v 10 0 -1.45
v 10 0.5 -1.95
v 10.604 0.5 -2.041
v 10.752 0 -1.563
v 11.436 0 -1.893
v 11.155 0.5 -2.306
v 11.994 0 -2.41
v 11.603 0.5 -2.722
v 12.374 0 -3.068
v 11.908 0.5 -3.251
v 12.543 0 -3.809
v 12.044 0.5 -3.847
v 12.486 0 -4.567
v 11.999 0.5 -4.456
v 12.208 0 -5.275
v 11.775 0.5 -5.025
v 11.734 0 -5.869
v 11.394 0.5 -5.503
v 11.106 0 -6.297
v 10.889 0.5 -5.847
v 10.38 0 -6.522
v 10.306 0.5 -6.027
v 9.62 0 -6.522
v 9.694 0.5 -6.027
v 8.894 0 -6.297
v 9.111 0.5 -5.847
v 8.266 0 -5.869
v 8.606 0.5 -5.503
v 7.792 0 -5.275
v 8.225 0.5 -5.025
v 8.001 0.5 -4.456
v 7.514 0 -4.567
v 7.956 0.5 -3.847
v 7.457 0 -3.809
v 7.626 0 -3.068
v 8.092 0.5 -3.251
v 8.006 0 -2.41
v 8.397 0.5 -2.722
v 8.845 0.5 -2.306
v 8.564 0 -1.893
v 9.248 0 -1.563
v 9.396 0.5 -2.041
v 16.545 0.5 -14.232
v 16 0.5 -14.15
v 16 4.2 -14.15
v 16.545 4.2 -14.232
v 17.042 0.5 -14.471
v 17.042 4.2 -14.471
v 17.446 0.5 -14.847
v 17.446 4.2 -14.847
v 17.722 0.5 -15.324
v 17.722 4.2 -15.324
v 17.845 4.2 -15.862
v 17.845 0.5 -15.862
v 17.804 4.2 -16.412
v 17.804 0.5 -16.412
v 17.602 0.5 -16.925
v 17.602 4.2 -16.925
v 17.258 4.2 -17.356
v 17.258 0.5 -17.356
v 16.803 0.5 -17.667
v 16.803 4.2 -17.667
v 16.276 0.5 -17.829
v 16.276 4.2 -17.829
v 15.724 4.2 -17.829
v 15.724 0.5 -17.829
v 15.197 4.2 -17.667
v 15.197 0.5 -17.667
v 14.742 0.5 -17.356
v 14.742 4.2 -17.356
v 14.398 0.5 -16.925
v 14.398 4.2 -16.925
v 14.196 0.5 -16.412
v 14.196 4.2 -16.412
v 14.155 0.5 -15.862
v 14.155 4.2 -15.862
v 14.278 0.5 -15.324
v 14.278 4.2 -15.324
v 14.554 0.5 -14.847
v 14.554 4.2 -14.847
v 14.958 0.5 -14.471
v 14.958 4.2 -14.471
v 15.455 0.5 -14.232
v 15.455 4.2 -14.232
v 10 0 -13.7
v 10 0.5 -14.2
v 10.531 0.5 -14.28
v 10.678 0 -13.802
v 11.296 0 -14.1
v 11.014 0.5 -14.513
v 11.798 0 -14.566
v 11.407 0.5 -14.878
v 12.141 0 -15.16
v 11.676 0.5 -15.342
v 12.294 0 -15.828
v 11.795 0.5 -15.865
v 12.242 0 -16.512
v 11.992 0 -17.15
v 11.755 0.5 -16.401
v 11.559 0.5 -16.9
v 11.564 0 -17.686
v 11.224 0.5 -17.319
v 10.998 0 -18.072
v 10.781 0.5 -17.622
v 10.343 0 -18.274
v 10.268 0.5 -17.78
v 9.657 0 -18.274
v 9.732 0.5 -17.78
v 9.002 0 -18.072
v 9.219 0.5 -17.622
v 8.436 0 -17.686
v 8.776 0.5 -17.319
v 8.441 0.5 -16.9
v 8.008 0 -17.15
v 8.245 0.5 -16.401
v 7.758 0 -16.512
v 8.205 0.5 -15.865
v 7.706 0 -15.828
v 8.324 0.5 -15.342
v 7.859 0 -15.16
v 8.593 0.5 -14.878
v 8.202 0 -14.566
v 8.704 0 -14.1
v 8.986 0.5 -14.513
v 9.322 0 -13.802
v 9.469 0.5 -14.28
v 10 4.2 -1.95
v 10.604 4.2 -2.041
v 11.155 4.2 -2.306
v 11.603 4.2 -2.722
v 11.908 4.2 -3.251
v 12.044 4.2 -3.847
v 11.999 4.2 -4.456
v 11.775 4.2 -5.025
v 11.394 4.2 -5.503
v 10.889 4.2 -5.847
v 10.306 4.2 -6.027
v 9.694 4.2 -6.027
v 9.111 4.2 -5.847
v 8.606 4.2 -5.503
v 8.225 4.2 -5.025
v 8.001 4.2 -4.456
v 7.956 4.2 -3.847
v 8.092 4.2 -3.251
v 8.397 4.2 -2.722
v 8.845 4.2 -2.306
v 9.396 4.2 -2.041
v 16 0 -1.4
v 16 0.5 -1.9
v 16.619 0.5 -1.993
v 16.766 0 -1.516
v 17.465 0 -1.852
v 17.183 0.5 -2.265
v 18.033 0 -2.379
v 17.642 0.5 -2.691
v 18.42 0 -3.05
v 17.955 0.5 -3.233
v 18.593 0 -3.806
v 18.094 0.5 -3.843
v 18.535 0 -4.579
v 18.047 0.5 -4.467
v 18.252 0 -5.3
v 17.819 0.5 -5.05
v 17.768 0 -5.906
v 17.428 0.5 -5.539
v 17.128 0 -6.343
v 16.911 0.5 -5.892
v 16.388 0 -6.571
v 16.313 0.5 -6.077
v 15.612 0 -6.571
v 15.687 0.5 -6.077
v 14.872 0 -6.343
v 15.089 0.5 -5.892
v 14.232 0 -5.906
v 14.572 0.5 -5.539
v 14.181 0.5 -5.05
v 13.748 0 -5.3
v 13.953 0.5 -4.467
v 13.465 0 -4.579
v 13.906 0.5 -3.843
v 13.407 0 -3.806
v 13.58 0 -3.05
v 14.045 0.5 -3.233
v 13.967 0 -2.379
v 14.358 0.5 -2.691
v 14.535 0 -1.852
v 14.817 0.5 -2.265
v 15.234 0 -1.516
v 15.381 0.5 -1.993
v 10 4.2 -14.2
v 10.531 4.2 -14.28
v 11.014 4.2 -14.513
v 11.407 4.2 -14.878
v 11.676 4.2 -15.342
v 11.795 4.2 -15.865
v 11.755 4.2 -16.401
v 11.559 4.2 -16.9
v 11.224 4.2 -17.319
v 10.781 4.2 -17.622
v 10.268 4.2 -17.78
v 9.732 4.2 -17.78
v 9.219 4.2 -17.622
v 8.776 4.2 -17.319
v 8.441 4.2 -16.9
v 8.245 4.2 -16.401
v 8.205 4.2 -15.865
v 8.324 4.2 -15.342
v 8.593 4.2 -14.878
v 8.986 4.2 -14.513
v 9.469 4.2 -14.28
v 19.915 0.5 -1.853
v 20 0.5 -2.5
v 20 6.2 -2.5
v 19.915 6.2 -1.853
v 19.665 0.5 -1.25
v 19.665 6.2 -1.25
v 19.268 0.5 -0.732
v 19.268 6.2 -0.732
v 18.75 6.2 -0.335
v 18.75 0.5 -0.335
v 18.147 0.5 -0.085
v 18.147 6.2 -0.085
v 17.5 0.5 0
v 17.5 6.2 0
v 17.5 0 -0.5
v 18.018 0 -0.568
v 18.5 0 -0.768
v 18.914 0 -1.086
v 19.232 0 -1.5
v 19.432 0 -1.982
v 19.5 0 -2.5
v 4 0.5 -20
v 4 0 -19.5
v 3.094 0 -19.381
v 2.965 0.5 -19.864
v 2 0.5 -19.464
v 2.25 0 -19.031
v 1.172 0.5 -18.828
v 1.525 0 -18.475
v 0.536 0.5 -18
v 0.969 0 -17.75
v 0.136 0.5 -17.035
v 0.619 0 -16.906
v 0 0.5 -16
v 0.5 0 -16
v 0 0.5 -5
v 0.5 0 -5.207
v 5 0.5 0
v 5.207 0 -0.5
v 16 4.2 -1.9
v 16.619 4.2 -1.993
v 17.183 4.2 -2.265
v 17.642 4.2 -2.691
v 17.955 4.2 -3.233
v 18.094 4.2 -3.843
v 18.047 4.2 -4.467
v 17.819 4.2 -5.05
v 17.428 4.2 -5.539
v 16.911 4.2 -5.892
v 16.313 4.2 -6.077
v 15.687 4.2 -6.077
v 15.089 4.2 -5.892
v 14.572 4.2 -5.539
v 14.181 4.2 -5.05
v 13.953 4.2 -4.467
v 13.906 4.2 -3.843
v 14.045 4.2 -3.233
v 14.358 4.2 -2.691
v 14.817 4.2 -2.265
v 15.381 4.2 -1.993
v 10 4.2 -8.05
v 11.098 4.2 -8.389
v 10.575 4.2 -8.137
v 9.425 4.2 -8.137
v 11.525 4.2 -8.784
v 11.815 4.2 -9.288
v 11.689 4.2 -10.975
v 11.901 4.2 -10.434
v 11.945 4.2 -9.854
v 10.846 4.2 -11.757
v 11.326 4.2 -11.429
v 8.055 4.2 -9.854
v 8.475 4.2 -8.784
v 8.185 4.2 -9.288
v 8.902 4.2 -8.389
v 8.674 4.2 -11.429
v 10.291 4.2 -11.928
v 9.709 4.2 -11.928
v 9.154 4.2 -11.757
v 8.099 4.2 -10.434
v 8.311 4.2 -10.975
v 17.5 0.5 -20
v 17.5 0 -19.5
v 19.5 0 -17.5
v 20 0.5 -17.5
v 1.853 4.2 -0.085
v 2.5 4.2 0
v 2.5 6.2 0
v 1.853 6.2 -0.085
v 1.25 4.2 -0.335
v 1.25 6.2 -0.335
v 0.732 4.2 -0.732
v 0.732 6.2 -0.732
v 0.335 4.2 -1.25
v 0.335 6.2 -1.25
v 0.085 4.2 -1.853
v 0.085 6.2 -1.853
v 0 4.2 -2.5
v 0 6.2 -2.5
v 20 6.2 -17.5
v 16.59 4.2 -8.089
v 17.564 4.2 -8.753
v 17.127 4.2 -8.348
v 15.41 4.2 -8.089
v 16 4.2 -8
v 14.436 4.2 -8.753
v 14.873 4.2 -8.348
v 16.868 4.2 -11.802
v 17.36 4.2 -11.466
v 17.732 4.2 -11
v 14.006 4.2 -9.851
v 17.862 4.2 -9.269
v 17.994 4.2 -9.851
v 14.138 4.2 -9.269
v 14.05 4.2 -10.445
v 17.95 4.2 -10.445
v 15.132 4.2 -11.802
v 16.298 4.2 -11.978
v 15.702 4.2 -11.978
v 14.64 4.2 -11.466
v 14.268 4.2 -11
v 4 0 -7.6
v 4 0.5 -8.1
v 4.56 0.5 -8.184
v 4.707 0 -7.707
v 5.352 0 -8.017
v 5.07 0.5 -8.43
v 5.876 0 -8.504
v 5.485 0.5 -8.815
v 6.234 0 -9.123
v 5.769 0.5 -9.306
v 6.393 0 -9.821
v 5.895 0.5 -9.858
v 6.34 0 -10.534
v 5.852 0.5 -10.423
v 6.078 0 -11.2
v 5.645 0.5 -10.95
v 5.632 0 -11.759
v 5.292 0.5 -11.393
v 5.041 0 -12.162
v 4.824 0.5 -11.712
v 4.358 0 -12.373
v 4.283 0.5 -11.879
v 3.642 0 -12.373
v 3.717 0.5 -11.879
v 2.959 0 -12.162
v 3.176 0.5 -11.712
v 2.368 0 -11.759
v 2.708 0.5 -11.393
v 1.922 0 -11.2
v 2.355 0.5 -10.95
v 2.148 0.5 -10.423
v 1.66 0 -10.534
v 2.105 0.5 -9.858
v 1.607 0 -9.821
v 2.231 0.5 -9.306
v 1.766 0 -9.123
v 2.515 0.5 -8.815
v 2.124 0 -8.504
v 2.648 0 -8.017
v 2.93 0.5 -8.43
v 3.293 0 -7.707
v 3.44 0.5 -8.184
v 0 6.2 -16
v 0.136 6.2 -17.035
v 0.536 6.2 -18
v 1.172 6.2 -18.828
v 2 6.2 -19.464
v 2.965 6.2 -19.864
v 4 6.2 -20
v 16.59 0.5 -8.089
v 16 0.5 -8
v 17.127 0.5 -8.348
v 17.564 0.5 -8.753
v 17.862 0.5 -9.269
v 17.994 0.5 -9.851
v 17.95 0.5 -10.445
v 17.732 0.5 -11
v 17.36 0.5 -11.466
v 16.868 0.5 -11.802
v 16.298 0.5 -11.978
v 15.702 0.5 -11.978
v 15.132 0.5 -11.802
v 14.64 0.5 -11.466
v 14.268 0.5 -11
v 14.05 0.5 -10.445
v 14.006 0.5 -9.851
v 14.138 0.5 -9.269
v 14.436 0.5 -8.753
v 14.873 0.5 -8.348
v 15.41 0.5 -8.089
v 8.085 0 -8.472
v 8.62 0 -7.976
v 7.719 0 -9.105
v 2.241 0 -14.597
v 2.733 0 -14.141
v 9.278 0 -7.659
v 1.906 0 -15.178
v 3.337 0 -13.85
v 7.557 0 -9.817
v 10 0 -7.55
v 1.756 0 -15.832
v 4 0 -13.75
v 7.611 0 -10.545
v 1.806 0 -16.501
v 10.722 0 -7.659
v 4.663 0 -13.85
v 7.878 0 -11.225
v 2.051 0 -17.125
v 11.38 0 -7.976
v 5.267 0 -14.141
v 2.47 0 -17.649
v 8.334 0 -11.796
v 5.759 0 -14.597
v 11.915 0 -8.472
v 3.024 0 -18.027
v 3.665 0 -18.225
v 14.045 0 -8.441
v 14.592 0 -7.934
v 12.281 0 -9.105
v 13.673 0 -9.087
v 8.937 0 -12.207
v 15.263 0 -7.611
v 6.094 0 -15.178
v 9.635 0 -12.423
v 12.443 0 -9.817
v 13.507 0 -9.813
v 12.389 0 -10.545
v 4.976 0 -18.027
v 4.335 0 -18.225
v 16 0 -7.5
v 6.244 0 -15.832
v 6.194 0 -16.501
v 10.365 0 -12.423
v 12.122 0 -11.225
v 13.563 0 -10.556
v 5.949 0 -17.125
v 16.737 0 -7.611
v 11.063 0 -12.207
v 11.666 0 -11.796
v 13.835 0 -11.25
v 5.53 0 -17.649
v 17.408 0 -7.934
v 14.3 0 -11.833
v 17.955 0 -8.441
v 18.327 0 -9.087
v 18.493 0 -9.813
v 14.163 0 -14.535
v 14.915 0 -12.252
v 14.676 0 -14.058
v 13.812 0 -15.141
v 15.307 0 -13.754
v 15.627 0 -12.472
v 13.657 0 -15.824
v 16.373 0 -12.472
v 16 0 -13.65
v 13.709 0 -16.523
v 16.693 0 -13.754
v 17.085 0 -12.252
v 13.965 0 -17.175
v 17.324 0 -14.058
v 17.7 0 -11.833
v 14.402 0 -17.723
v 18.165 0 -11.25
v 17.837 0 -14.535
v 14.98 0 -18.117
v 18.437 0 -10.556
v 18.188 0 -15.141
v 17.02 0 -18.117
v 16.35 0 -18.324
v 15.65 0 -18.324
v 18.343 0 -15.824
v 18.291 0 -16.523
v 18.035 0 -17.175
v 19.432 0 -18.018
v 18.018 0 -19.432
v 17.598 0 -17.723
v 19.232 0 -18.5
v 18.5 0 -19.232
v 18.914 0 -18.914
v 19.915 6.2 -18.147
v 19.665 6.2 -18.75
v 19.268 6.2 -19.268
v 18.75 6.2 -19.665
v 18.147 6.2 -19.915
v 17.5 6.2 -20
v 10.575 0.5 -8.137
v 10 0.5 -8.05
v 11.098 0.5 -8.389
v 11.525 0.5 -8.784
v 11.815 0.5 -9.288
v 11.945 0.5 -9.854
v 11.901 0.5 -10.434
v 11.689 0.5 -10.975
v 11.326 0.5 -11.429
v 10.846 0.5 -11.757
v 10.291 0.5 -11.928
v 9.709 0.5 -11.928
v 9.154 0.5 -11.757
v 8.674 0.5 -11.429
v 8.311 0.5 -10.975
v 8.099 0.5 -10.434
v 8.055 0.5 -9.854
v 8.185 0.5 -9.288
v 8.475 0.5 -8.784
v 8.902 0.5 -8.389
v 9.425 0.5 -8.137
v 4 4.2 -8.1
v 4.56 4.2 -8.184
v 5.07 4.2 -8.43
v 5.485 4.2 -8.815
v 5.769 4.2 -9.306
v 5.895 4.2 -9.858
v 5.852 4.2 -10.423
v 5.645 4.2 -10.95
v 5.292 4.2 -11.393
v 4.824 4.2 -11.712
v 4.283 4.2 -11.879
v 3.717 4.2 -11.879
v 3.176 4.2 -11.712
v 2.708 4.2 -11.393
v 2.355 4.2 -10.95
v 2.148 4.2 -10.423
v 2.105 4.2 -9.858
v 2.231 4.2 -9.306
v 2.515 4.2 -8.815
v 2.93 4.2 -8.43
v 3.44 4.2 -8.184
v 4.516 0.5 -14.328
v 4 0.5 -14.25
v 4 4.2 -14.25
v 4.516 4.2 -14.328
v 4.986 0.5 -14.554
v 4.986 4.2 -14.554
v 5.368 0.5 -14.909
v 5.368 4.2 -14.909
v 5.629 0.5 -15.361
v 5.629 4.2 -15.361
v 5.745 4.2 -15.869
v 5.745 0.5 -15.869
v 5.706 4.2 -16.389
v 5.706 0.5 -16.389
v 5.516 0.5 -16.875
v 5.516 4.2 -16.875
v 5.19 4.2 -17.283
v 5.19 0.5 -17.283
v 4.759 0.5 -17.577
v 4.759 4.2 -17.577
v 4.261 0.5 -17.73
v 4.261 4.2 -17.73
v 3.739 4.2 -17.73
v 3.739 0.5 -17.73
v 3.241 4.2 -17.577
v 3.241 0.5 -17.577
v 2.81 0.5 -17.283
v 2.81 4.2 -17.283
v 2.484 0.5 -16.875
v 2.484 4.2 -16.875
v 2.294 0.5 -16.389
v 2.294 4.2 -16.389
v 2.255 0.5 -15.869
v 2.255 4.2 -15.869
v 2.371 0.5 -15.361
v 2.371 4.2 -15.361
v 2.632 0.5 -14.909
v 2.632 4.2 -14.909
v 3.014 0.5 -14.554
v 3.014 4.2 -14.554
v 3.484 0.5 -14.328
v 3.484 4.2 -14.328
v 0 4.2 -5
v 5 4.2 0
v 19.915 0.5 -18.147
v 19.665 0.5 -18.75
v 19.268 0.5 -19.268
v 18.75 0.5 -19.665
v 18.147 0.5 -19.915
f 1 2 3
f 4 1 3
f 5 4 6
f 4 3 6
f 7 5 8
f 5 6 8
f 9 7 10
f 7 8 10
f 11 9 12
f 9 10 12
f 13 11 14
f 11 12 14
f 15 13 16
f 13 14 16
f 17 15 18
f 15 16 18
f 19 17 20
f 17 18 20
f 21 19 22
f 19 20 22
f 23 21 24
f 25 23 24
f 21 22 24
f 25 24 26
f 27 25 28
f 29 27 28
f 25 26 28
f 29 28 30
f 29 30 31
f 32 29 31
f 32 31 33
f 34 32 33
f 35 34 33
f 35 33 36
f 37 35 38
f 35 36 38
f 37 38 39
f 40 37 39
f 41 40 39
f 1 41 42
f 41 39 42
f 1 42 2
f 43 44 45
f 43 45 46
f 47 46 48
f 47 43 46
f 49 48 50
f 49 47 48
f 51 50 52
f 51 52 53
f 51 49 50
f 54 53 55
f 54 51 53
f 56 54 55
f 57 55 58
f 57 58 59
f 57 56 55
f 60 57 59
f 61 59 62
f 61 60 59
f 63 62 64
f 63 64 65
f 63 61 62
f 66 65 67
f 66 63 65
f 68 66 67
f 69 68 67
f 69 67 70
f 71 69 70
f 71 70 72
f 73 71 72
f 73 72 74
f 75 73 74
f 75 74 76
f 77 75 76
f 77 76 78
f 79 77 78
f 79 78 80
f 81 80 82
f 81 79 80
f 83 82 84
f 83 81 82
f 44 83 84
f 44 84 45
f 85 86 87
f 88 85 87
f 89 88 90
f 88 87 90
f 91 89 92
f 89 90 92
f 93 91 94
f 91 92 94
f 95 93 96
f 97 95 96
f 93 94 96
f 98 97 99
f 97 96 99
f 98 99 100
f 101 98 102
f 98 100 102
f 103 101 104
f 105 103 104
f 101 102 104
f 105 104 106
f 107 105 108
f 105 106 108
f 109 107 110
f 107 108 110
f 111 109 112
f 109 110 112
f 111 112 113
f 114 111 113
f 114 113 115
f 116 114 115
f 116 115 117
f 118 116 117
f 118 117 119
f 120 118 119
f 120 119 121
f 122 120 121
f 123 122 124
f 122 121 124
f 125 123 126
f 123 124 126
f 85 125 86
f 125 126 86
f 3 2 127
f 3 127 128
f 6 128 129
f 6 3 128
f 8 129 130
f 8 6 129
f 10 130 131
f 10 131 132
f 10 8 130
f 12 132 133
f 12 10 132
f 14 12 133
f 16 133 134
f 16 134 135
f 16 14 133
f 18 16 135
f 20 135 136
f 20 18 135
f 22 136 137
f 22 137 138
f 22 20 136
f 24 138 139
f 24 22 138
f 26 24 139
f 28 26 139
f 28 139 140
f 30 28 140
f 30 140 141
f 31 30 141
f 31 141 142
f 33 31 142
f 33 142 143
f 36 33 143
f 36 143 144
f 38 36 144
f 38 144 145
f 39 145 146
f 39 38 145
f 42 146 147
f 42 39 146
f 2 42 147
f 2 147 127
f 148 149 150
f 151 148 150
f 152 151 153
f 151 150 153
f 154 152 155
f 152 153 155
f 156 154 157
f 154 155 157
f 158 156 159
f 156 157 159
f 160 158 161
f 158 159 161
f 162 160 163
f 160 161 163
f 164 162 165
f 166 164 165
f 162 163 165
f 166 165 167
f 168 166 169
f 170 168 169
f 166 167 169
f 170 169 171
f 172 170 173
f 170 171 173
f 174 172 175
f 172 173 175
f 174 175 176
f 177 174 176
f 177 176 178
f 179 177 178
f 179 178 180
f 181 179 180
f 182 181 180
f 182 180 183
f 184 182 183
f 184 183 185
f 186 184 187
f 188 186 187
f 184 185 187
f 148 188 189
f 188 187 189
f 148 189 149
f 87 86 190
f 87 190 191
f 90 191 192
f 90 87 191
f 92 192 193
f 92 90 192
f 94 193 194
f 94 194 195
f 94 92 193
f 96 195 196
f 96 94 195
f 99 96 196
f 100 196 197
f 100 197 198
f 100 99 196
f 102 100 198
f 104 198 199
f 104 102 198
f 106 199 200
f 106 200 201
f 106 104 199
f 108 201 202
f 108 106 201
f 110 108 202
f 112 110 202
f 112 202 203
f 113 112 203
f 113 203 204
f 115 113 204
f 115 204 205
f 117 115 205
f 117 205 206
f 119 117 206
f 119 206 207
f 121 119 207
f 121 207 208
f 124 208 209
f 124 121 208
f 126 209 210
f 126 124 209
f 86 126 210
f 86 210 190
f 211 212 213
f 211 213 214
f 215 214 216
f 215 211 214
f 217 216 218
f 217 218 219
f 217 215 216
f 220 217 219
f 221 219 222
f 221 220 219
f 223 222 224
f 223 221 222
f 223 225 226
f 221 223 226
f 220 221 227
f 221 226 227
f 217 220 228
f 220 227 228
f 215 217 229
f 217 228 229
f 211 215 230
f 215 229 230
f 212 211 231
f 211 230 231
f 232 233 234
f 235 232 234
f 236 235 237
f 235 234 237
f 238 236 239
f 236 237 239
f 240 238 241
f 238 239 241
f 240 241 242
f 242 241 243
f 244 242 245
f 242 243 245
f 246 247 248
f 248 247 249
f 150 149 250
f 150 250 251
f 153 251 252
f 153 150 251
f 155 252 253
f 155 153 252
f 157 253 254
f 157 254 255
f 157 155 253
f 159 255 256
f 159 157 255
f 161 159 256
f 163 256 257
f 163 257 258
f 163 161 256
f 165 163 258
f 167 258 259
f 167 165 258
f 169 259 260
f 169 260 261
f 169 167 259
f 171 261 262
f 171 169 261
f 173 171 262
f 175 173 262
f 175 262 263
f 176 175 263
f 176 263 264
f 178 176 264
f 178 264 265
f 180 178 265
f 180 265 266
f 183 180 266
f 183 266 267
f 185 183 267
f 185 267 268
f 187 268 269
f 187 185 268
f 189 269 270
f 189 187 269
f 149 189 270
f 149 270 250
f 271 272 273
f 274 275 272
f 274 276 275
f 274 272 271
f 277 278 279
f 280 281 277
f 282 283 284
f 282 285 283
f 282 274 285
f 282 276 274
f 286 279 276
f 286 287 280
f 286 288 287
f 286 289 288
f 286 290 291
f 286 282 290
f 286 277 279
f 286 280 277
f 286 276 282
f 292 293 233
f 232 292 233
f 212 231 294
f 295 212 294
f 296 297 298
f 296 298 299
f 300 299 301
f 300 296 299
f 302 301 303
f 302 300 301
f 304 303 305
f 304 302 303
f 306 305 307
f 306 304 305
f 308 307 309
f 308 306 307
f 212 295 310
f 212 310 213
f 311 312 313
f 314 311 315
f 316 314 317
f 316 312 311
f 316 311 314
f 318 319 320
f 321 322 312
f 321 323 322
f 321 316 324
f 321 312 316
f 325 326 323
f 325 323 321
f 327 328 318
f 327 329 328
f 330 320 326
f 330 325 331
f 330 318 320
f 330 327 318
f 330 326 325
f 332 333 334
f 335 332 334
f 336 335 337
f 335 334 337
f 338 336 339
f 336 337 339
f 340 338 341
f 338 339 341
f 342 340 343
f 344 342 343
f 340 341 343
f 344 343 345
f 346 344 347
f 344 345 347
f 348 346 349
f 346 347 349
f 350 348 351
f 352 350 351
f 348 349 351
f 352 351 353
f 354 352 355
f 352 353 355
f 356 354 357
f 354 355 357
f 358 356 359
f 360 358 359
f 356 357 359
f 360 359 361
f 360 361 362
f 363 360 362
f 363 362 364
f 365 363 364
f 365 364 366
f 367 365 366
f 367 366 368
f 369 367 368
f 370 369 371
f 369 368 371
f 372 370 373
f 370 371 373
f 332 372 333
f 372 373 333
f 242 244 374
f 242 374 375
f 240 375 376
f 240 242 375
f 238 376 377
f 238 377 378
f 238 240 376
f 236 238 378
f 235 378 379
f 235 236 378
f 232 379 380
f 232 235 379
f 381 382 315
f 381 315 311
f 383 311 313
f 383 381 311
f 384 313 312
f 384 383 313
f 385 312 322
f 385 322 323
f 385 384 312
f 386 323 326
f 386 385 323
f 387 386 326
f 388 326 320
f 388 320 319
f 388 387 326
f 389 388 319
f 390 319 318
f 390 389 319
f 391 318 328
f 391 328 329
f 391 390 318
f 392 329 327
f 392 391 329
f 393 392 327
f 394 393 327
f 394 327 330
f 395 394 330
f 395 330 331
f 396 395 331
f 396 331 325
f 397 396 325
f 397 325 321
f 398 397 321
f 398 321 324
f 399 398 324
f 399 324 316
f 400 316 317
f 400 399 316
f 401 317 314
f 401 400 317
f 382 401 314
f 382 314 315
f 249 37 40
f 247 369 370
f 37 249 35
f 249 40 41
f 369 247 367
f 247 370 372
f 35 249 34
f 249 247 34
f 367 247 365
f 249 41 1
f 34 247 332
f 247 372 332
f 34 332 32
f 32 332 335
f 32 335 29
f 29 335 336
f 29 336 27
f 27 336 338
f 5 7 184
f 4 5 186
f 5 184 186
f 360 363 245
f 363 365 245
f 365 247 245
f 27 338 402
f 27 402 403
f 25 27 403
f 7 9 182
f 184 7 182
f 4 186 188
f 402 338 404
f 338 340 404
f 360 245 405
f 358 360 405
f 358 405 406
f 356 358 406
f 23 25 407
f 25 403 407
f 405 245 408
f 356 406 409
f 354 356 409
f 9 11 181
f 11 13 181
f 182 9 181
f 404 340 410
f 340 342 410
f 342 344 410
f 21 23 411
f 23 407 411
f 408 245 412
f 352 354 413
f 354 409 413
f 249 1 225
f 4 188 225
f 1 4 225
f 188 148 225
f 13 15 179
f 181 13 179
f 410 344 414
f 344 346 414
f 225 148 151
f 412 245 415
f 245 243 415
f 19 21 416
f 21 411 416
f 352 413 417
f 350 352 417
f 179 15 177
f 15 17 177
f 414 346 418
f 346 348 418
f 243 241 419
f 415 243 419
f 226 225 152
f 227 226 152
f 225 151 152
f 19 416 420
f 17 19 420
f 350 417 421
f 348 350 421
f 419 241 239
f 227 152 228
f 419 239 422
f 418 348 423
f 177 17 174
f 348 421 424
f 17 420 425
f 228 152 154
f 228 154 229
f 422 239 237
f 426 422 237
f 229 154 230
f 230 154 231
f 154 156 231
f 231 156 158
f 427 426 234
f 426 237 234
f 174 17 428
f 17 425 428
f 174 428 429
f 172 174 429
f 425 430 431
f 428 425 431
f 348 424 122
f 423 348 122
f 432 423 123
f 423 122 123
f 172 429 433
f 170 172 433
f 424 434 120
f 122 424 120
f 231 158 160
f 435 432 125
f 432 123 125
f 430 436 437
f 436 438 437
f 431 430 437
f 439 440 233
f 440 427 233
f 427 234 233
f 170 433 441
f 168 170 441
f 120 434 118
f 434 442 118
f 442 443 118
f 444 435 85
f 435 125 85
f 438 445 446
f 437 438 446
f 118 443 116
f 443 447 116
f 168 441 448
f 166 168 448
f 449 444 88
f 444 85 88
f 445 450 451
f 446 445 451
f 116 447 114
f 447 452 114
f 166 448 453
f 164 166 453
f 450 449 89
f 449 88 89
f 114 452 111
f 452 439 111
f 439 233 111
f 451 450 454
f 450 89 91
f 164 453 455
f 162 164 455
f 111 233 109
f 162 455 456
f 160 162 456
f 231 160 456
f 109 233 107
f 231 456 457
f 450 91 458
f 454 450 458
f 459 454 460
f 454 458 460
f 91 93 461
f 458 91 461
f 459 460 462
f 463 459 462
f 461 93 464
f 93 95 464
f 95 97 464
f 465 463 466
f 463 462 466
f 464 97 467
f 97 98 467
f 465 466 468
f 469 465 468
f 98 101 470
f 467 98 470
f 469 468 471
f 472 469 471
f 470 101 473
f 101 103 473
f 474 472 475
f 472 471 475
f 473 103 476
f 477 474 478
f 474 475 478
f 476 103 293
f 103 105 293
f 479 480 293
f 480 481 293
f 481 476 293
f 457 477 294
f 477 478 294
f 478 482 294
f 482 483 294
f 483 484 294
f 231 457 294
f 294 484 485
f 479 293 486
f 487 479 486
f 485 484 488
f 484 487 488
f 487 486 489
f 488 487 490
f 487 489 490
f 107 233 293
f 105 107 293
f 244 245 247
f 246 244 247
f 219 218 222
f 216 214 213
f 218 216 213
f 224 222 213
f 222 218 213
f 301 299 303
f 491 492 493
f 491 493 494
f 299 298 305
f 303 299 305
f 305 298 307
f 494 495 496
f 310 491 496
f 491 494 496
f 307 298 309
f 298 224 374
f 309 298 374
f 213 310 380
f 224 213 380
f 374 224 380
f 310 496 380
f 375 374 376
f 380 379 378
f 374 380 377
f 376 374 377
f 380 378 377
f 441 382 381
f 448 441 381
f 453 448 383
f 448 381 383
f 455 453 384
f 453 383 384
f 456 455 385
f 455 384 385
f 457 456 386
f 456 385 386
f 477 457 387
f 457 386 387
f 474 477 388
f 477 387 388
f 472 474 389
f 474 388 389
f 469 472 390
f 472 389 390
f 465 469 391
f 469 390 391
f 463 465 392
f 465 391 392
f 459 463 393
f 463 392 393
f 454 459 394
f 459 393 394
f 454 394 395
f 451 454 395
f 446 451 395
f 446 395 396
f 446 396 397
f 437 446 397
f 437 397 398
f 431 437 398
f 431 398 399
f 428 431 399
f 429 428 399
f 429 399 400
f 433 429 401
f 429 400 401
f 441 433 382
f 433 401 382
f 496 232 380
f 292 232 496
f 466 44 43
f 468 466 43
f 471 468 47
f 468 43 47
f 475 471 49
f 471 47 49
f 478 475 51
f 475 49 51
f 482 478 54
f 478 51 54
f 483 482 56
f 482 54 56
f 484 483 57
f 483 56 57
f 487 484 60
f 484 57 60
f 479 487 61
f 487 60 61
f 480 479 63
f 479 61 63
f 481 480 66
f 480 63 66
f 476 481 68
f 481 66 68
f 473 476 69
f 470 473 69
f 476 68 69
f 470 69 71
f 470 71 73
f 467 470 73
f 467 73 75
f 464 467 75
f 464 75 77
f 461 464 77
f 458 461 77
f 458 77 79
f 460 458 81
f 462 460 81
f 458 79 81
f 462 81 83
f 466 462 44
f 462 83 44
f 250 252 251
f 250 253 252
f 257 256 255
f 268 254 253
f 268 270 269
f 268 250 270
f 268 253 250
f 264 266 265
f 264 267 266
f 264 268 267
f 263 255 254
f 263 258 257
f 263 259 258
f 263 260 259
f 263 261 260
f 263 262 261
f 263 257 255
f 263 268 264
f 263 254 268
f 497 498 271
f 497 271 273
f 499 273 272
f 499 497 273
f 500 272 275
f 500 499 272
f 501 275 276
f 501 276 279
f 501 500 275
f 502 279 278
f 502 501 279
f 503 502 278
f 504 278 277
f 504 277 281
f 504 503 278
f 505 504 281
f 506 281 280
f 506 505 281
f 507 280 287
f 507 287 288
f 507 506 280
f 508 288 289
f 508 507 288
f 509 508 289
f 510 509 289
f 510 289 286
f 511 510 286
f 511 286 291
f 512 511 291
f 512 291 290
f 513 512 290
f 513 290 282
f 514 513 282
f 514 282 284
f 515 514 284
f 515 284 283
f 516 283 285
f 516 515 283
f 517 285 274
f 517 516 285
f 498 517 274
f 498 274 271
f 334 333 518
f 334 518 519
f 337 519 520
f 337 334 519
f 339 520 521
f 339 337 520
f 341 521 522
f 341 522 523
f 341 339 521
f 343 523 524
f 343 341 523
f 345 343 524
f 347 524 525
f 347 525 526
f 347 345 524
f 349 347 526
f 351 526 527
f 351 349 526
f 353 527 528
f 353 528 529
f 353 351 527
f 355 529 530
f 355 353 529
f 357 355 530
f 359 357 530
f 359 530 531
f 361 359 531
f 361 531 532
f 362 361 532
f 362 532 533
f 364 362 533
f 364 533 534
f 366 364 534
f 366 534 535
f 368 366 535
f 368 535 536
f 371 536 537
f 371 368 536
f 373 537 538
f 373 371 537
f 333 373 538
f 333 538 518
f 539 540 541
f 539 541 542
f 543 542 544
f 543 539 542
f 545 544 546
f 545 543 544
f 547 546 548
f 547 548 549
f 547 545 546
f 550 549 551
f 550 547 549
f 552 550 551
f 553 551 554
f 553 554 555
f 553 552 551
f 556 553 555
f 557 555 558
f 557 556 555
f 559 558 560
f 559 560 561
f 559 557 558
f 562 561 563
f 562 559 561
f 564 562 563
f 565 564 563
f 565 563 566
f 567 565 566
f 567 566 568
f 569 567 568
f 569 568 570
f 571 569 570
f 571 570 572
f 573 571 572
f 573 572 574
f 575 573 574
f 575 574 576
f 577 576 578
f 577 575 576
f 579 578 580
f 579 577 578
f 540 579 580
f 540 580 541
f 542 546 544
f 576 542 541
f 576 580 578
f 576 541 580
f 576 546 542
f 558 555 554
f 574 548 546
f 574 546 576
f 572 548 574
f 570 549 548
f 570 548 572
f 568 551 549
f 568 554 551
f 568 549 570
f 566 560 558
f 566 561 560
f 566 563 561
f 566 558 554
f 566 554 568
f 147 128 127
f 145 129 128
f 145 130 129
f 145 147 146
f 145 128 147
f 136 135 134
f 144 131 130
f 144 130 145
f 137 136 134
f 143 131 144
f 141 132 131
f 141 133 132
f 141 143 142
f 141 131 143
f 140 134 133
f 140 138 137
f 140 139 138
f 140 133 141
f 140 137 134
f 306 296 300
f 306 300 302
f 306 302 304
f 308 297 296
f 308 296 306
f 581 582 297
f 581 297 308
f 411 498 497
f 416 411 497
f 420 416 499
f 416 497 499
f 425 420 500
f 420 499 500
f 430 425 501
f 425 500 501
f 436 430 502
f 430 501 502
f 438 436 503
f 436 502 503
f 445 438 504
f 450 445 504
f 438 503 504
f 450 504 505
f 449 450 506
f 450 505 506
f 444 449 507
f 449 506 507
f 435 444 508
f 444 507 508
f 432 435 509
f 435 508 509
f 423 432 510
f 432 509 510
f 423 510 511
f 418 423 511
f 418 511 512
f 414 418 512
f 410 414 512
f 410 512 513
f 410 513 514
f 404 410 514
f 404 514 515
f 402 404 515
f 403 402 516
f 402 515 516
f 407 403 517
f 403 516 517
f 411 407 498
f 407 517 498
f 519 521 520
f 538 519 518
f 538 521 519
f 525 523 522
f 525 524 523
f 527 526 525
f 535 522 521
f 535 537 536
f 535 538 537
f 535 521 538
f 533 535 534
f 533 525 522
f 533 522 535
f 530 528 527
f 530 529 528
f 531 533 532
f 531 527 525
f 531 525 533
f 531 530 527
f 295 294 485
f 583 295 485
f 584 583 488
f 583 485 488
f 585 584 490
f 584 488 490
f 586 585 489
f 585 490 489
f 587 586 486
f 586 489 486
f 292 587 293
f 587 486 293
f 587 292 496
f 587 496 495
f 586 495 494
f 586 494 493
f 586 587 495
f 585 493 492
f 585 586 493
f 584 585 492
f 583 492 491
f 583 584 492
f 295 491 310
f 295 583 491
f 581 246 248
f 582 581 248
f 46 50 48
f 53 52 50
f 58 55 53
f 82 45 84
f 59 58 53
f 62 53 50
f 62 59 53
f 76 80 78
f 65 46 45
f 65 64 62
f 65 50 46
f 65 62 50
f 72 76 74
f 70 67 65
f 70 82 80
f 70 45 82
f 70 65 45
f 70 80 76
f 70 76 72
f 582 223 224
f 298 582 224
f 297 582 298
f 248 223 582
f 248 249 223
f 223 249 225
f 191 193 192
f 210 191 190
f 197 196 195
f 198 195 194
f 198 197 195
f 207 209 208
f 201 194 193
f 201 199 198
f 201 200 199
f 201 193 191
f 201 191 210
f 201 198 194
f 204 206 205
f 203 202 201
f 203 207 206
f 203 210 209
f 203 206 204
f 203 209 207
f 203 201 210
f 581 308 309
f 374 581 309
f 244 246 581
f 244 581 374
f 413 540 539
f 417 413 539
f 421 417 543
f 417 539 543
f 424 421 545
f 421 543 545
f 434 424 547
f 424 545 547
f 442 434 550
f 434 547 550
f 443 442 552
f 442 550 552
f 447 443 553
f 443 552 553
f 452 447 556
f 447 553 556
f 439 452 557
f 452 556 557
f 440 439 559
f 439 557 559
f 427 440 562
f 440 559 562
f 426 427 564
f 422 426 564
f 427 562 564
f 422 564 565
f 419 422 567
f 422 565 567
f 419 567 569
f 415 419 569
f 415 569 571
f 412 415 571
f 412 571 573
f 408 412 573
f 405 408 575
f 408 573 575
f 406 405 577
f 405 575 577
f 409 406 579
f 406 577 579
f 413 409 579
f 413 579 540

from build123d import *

# Parameters (mm, degrees)
SKETCH1_R           = 2.05
SKETCH1_R_2         = 2.1
SKETCH1_R_3         = 1.9
SKETCH1_R_4         = 1.75
SKETCH1_R_5         = 1.95
SKETCH1_R_6         = 2
SKETCH1_R_7         = 1.8
SKETCH1_R_8         = 1.85
BOSS_EXTRUDE1_DEPTH = 4.2
BOSS_EXTRUDE2_DEPTH = 2
CHAMFER1_SIZE       = 0.5


with BuildPart() as part:
    # Sketch1 → Boss-Extrude1 (new body)
    with BuildSketch(Plane(origin=(0, 0, 0), x_dir=(1, 0, 0), z_dir=(0, 1, 0))):
        with BuildLine():
            Line((0, 5), (5, 0))
            Line((5, 0), (17.5, 0))
            ThreePointArc((17.5, 0), (19.267766953, 0.732233047), (20, 2.5))
            Line((20, 2.5), (20, 17.5))
            ThreePointArc((20, 17.5), (19.267766953, 19.267766953), (17.5, 20))
            Line((17.5, 20), (4, 20))
            ThreePointArc((4, 20), (1.171572875, 18.828427125), (0, 16))
            Line((0, 16), (0, 5))
        make_face()
        with Locations(Location((10, 4, 0), (0, 0, 270))):
            Circle(SKETCH1_R, mode=Mode.SUBTRACT)
        with Locations(Location((16, 4, 0), (0, 0, 270))):
            Circle(SKETCH1_R_2, mode=Mode.SUBTRACT)
        with Locations(Location((4, 10, 0), (0, 0, 270))):
            Circle(SKETCH1_R_3, mode=Mode.SUBTRACT)
        with Locations(Location((4, 16, 0), (0, 0, 270))):
            Circle(SKETCH1_R_4, mode=Mode.SUBTRACT)
        with Locations(Location((10, 10, 0), (0, 0, 270))):
            Circle(SKETCH1_R_5, mode=Mode.SUBTRACT)
        with Locations(Location((16, 10, 0), (0, 0, 270))):
            Circle(SKETCH1_R_6, mode=Mode.SUBTRACT)
        with Locations(Location((10, 16, 0), (0, 0, 270))):
            Circle(SKETCH1_R_7, mode=Mode.SUBTRACT)
        with Locations(Location((16, 16, 0), (0, 0, 270))):
            Circle(SKETCH1_R_8, mode=Mode.SUBTRACT)
    extrude(amount=BOSS_EXTRUDE1_DEPTH)

    # Sketch2 → Boss-Extrude2 (add)
    with BuildSketch(Plane(origin=(0, 4.2, 0), x_dir=(1, 0, 0), z_dir=(0, 1, 0))):
        with BuildLine():
            Line((20, 17.5), (20, 2.5))
            ThreePointArc((20, 2.5), (19.267766953, 0.732233047), (17.5, 0))
            Line((17.5, 0), (2.5, 0))
            ThreePointArc((2.5, 0), (0.732233047, 0.732233047), (0, 2.5))
            Line((0, 2.5), (0, 5))
            Line((0, 5), (0, 16))
            ThreePointArc((0, 16), (1.171572875, 18.828427125), (4, 20))
            Line((4, 20), (17.5, 20))
            ThreePointArc((17.5, 20), (19.267766953, 19.267766953), (20, 17.5))
        make_face()
    extrude(amount=BOSS_EXTRUDE2_DEPTH)

    # Chamfer1
    chamfer1_edges = [part.edges().sort_by_distance(p)[0] for p in [
        (19.267766953, 0, -19.267766953),
        (20, 0, -10),
        (19.267766953, 0, -0.732233047),
        (11.25, 0, 0),
        (2.5, 0, -2.5),
        (0, 0, -10.5),
        (1.171572875, 0, -18.828427125),
        (10.75, 0, -20),
        (4, 0, -17.75),
        (10, 0, -17.8),
        (16, 0, -17.85),
        (4, 0, -11.9),
        (10, 0, -11.95),
        (16, 0, -12),
        (10, 0, -6.05),
        (16, 0, -6.1),
    ]]
    chamfer(chamfer1_edges, length=CHAMFER1_SIZE)


solid = part.part
